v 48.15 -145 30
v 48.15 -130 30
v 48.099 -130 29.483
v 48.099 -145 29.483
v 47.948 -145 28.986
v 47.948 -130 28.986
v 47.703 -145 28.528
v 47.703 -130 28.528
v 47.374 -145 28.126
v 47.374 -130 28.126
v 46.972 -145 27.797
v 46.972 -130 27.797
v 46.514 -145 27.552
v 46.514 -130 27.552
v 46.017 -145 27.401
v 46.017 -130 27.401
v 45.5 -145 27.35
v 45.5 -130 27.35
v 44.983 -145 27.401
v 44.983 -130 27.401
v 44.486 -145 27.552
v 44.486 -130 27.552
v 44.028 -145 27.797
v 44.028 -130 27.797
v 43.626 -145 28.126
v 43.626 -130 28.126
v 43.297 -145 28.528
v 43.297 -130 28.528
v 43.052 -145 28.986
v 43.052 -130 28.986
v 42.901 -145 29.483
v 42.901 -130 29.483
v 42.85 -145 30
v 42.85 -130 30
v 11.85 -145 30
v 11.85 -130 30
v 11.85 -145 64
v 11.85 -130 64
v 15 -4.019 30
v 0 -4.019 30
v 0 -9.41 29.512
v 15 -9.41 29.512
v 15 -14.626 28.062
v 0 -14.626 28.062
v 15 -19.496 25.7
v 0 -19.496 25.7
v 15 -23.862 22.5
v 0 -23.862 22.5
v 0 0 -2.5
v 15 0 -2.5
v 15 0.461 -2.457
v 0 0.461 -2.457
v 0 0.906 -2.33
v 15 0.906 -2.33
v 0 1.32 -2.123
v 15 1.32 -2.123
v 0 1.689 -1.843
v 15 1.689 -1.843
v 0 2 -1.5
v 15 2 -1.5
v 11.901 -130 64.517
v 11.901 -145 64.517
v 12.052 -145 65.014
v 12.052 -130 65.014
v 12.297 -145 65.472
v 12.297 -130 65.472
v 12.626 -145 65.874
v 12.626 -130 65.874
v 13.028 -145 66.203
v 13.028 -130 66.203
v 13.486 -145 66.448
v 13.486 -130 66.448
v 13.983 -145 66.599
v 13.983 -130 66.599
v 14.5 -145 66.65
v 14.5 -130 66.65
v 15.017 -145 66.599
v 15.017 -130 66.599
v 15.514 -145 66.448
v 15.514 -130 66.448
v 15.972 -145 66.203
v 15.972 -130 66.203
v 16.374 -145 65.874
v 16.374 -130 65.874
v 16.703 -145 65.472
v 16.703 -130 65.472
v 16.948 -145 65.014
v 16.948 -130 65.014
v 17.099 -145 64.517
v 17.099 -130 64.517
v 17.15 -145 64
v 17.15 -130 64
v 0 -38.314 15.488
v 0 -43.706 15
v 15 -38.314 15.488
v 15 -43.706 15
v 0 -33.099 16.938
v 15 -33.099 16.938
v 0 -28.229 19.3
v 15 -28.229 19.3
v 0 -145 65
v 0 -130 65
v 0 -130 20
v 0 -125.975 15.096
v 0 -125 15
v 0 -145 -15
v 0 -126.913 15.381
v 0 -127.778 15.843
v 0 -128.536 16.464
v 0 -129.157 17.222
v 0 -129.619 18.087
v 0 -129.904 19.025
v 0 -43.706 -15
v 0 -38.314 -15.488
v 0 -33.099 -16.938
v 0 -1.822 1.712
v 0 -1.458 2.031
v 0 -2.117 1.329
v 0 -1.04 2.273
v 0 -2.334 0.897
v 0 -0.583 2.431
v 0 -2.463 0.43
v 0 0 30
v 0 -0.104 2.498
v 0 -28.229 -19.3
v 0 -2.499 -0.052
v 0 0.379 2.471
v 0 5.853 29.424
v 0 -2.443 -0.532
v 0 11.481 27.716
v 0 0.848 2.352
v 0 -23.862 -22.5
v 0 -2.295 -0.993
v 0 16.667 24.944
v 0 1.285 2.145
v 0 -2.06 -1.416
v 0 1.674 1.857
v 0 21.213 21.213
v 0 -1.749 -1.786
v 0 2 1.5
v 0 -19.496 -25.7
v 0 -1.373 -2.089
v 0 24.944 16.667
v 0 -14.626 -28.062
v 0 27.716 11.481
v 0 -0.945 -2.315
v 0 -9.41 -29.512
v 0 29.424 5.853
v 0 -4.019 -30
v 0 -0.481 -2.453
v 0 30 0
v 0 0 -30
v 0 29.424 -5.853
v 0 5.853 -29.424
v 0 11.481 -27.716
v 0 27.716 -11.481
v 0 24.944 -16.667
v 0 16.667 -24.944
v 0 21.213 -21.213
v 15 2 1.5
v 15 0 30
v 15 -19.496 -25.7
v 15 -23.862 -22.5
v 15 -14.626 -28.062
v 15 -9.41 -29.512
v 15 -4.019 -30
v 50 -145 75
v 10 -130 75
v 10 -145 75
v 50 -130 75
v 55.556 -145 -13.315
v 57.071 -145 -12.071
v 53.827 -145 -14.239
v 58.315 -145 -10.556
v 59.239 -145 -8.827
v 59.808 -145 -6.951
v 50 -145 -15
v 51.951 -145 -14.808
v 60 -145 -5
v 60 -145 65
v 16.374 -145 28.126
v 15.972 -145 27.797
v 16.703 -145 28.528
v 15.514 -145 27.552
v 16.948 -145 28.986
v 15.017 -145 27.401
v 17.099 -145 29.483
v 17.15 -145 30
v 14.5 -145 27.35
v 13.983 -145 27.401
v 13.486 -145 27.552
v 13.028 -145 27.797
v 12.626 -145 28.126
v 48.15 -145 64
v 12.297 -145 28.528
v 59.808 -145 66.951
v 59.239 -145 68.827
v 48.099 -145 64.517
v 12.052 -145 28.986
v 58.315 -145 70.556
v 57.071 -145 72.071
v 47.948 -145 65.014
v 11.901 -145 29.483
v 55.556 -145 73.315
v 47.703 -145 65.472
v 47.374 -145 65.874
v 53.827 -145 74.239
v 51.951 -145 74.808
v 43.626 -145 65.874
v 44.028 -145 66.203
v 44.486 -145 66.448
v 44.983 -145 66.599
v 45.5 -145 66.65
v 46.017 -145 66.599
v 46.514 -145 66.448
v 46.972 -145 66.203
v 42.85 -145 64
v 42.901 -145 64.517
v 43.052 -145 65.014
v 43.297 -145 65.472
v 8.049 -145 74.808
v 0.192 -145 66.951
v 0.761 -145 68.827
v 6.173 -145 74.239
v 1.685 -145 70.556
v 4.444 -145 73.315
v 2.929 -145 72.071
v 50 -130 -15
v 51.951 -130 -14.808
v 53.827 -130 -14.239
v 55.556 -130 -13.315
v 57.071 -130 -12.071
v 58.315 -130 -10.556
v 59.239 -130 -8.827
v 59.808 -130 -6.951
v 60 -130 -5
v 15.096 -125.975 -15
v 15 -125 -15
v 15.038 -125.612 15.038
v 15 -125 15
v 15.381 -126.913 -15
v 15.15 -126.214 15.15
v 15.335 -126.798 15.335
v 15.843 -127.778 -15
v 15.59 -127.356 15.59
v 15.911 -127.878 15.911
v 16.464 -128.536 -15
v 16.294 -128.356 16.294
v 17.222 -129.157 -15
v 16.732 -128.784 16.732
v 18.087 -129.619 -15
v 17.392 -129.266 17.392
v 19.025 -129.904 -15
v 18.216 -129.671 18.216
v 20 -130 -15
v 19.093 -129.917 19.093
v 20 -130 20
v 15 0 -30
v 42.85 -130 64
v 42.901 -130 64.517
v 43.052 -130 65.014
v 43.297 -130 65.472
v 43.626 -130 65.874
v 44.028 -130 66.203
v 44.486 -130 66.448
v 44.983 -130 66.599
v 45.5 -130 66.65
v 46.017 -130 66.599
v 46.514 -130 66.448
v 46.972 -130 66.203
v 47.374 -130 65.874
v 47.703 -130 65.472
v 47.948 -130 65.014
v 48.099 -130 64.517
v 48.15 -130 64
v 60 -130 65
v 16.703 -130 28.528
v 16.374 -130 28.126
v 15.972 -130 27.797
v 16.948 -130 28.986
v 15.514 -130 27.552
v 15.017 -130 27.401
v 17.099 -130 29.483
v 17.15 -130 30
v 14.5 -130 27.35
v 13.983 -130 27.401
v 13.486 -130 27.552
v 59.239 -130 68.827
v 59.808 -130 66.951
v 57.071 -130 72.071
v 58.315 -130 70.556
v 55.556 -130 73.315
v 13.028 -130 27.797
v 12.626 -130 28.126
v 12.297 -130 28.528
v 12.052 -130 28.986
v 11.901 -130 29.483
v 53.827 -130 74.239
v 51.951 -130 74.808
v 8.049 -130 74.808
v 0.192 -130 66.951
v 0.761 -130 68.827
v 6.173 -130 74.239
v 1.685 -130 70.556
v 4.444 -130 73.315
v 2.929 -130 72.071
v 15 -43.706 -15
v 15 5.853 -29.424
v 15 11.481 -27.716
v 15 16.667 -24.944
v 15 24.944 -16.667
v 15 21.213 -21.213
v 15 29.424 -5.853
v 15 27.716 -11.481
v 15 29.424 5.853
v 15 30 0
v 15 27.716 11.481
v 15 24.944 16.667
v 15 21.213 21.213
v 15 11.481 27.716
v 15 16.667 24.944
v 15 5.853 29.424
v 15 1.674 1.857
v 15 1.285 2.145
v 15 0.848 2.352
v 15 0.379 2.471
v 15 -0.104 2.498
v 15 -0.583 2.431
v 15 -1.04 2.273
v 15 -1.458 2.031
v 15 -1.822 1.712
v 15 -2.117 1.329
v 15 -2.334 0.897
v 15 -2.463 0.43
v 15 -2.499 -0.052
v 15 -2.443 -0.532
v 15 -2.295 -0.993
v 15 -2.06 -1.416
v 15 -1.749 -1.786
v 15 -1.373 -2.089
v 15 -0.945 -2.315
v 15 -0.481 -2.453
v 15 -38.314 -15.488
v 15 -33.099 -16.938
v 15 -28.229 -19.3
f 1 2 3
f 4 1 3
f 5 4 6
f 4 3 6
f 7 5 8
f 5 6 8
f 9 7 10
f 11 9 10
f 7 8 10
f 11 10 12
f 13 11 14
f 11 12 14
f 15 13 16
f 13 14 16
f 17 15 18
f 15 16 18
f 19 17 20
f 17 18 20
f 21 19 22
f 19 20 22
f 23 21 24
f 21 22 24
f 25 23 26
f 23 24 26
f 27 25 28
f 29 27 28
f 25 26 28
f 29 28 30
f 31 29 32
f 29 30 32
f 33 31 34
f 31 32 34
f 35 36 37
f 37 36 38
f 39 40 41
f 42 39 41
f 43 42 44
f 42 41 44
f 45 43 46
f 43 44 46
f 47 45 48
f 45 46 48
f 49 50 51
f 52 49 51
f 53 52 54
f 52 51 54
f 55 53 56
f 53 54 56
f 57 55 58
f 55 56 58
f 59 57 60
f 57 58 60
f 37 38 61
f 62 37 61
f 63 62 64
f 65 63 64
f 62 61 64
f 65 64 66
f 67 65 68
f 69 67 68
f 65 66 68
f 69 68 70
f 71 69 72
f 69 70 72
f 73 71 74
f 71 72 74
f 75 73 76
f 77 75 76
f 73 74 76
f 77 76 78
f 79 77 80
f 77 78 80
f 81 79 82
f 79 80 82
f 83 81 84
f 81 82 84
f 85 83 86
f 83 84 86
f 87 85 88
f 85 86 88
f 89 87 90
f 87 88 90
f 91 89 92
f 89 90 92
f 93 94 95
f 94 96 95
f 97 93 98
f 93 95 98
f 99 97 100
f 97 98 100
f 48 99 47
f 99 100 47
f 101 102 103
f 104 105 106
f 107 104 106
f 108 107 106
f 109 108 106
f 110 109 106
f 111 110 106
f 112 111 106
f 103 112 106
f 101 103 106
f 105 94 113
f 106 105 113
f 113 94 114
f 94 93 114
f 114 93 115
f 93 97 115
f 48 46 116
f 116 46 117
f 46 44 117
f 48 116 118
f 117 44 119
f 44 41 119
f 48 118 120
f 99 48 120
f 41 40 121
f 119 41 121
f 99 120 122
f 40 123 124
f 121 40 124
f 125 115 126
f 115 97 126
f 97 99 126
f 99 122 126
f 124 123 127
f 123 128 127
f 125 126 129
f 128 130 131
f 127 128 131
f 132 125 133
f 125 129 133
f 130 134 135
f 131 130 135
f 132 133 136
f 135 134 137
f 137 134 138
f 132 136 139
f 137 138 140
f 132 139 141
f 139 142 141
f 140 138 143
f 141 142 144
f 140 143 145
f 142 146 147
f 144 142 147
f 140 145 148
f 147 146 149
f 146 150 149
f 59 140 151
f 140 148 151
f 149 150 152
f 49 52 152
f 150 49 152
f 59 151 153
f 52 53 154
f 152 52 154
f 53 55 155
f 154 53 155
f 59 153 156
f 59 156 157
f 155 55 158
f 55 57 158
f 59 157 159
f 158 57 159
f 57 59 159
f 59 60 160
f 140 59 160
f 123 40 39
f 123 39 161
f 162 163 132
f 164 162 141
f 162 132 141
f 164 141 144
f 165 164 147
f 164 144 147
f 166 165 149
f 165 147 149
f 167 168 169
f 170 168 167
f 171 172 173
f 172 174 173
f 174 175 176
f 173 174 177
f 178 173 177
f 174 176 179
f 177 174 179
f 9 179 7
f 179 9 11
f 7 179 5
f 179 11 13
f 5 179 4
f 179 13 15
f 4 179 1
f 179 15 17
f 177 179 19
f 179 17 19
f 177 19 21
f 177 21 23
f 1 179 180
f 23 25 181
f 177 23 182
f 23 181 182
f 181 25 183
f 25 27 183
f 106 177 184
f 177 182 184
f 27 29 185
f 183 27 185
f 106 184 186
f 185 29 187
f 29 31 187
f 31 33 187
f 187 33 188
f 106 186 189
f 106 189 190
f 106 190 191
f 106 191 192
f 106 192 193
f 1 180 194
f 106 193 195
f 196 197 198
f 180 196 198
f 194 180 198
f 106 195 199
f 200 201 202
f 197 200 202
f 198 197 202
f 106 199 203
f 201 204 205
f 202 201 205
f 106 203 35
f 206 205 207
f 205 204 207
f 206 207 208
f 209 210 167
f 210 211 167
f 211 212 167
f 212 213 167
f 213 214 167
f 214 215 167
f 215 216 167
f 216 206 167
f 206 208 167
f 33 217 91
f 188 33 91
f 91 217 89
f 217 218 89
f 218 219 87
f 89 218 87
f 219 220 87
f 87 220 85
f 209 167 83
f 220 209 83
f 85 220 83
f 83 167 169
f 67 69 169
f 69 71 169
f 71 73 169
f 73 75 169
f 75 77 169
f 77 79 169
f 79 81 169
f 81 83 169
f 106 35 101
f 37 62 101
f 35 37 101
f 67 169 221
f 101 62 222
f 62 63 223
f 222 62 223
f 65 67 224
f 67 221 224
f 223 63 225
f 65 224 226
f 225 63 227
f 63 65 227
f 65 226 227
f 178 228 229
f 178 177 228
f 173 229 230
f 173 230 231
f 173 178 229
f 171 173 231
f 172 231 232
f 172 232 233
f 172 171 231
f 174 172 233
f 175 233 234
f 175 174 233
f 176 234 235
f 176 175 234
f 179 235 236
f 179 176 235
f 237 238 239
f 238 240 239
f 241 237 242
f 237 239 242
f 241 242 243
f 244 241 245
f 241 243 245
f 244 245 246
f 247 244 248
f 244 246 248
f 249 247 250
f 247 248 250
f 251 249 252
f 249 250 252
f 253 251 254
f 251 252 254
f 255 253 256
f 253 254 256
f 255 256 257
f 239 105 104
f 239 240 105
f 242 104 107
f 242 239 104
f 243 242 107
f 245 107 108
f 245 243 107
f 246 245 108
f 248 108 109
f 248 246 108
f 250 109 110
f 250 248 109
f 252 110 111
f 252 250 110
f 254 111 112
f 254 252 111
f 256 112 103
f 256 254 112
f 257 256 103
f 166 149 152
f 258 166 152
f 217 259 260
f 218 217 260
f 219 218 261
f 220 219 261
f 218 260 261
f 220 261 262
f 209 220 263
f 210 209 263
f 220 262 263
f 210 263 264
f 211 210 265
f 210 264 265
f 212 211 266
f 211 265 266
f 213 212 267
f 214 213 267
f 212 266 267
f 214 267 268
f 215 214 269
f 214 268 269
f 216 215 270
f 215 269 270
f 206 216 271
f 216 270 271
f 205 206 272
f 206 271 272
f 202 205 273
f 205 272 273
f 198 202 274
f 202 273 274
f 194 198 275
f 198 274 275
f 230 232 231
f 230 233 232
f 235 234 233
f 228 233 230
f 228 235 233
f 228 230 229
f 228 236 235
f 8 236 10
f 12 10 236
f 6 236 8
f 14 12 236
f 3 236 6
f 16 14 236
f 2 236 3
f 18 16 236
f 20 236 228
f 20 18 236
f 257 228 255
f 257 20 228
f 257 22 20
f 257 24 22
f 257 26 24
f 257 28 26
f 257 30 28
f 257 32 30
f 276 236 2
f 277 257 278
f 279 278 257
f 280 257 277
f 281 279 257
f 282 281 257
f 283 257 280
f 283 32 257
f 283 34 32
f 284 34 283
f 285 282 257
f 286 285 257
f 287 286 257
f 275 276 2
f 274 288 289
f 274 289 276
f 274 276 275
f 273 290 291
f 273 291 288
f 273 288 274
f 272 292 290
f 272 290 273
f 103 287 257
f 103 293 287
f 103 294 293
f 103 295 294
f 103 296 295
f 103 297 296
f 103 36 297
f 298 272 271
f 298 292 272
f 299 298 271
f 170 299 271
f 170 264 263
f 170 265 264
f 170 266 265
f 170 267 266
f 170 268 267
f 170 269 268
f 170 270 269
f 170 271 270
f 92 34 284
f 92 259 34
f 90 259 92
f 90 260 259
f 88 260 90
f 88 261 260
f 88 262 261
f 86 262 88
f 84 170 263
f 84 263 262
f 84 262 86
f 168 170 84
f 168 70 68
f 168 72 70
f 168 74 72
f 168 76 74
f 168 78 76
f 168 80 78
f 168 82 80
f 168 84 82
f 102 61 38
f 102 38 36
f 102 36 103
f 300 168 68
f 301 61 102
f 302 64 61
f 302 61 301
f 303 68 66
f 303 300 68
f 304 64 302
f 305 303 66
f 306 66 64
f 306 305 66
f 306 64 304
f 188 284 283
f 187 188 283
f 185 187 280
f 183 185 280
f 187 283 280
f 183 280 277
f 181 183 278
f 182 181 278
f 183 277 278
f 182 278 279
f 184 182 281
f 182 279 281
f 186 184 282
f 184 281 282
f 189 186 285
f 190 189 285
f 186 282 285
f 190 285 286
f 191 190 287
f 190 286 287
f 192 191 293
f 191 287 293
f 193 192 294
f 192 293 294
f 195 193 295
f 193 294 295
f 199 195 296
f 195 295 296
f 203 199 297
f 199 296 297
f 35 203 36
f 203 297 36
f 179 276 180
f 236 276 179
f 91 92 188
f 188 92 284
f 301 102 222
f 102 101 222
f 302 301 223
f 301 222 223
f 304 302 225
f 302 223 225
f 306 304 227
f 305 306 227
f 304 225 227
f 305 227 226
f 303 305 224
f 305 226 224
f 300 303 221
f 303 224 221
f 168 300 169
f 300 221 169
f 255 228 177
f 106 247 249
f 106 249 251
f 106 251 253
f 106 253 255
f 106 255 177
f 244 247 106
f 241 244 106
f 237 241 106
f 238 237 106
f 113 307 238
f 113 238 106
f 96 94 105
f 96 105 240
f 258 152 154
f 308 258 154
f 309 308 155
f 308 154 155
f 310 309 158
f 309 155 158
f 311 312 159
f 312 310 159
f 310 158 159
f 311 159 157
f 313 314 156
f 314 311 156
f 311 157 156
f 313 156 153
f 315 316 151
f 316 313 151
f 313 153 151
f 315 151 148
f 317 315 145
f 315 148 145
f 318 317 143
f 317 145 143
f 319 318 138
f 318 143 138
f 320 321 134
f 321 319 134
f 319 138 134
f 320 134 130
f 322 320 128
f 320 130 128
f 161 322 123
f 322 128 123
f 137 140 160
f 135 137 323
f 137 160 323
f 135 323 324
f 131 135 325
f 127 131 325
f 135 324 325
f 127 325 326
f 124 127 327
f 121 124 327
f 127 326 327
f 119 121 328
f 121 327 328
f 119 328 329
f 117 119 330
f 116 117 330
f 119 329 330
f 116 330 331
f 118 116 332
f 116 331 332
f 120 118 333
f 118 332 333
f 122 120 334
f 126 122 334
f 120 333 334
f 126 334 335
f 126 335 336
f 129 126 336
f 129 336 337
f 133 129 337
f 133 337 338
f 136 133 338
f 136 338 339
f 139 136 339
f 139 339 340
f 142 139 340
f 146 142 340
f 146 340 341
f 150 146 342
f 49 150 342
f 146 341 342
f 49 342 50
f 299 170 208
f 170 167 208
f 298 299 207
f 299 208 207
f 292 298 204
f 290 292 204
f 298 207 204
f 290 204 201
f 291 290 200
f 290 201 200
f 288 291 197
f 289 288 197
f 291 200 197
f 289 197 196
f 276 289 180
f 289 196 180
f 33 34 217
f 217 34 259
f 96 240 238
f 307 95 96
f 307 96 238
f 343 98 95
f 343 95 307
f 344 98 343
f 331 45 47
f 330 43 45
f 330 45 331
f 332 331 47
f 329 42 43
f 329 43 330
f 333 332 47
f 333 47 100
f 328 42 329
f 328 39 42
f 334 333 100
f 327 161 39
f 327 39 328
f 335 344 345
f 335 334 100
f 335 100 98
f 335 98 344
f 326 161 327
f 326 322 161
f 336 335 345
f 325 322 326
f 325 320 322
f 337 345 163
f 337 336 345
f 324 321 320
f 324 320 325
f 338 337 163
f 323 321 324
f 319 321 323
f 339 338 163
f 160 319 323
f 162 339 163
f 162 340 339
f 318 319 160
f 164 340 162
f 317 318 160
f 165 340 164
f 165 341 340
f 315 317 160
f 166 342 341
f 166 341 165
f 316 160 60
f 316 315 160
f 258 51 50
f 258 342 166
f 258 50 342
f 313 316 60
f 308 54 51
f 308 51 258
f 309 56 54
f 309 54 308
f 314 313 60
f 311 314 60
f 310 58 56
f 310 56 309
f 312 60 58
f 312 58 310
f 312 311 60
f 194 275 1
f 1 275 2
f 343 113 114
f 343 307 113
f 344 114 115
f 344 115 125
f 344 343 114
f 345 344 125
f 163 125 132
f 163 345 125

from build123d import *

# Parameters (mm, degrees)
SKETCH1_W           = 60
SKETCH1_H           = 60
BOSS_EXTRUDE1_DEPTH = 15
CUT_EXTRUDE1_DEPTH  = 15
SKETCH8_W           = 15
SKETCH8_H           = 30
BOSS_EXTRUDE2_DEPTH = 100
BOSS_EXTRUDE3_DEPTH = 15
CUT_EXTRUDE4_DEPTH  = 15
FILLET1_R           = 30
FILLET3_R           = 5
FILLET4_R           = 10
FILLET5_R           = 30


with BuildPart() as part:
    # Sketch1 → Boss-Extrude1 (new body)
    with BuildSketch(Plane(origin=(0, 0, 0), x_dir=(0, 0, -1), z_dir=(1, 0, 0))):
        Rectangle(SKETCH1_W, SKETCH1_H)
    extrude(amount=BOSS_EXTRUDE1_DEPTH)

    # Sketch2 → Cut-Extrude1 (cut)
    with BuildSketch(Plane(origin=(15, 0, 0), x_dir=(0, 0, -1), z_dir=(1, 0, 0))):
        with BuildLine():
            ThreePointArc((2.5, 0), (2.236067977, 1.118033989), (1.5, 2))
            Line((1.5, 2), (-1.5, 2))
            ThreePointArc((-1.5, 2), (-1.118033989, -2.236067977), (2.5, 0))
        make_face()
    extrude(amount=-CUT_EXTRUDE1_DEPTH, mode=Mode.SUBTRACT)

    # Sketch8 → Boss-Extrude2 (add)
    with BuildSketch(Plane.XZ.offset(30)):
        with Locations((7.5, 0)):
            Rectangle(SKETCH8_W, SKETCH8_H)
    extrude(amount=BOSS_EXTRUDE2_DEPTH)

    # Sketch9 → Boss-Extrude3 (add)
    with BuildSketch(Plane.XZ.offset(130)):
        Polygon((0, 0), (0, 75), (60, 75), (60, -15), (0, -15), align=None)
    extrude(amount=BOSS_EXTRUDE3_DEPTH)

    # Sketch10 → Cut-Extrude4 (cut)
    with BuildSketch(Plane(origin=(0, -130, 0), x_dir=(1, 0, 0), z_dir=(0, 1, 0))):
        with BuildLine():
            Line((48.15, -64), (48.15, -30))
            ThreePointArc((48.15, -30), (45.5, -27.35), (42.85, -30))
            Line((42.85, -30), (42.85, -64))
            ThreePointArc((42.85, -64), (45.5, -66.65), (48.15, -64))
        make_face()
        with BuildLine():
            Line((17.15, -64), (17.15, -30))
            ThreePointArc((17.15, -30), (14.5, -27.35), (11.85, -30))
            Line((11.85, -30), (11.85, -64))
            ThreePointArc((11.85, -64), (14.5, -66.65), (17.15, -64))
        make_face()
    extrude(amount=-CUT_EXTRUDE4_DEPTH, mode=Mode.SUBTRACT)

    # Fillet1
    # the kernel refuses this fillet: 30 mm, written as the material it takes off along each edge
    with BuildSketch(Plane(origin=(-75, 30, 30), x_dir=(0, -1, 0), z_dir=(1, 0, 0))) as fillet1_piece_1:
        with BuildLine():
            CenterArc((FILLET1_R, FILLET1_R), FILLET1_R, 180, 90)
            Line((0, FILLET1_R), (-FILLET1_R * 0.02, FILLET1_R))
            Line((-FILLET1_R * 0.02, FILLET1_R), (-FILLET1_R * 0.02, -FILLET1_R * 0.02))
            Line((-FILLET1_R * 0.02, -FILLET1_R * 0.02), (FILLET1_R, -FILLET1_R * 0.02))
            Line((FILLET1_R, -FILLET1_R * 0.02), (FILLET1_R, 0))
        make_face()
    extrude(amount=165, mode=Mode.SUBTRACT)
    with BuildSketch(Plane(origin=(-64.951905284, -30, 30), x_dir=(0, 0, -1), z_dir=(1, 0, 0))) as fillet1_piece_2:
        with BuildLine():
            CenterArc((30, 25.980762114), FILLET1_R, 180, 60)
            Line((0, 25.980762114), (-0.6, 25.980762114))
            Line((-0.6, 25.980762114), (-0.6, 0))
            Line((-0.6, 0), (0, -0.6))
            ThreePointArc((0, -0.6), (7.5, -0.6), (14.7, -0.519615242))
            Line((14.7, -0.519615242), (15, 0))
        make_face()
    extrude(amount=144.903810568, mode=Mode.SUBTRACT)
    with BuildSketch(Plane(origin=(-64.951905284, -30, -30), x_dir=(0, 0, 1), z_dir=(1, 0, 0))) as fillet1_piece_3:
        with BuildLine():
            CenterArc((30, -25.980762114), FILLET1_R, 120, 60)
            Line((0, -25.980762114), (-0.6, -25.980762114))
            Line((-0.6, -25.980762114), (-0.6, 0))
            Line((-0.6, 0), (0, 0.6))
            ThreePointArc((0, 0.6), (7.5, 0.6), (14.7, 0.519615242))
            Line((14.7, 0.519615242), (15, 0))
        make_face()
    extrude(amount=144.903810568, mode=Mode.SUBTRACT)
    with BuildSketch(Plane(origin=(-75, 30, -30), x_dir=(0, -1, 0), z_dir=(1, 0, 0))) as fillet1_piece_4:
        with BuildLine():
            CenterArc((FILLET1_R, -FILLET1_R), FILLET1_R, 90, 90)
            Line((0, -FILLET1_R), (-FILLET1_R * 0.02, -FILLET1_R))
            Line((-FILLET1_R * 0.02, -FILLET1_R), (-FILLET1_R * 0.02, FILLET1_R * 0.02))
            Line((-FILLET1_R * 0.02, FILLET1_R * 0.02), (FILLET1_R, FILLET1_R * 0.02))
            Line((FILLET1_R, FILLET1_R * 0.02), (FILLET1_R, 0))
        make_face()
    extrude(amount=165, mode=Mode.SUBTRACT)

    # Fillet3
    fillet3_edges = [part.edges().sort_by_distance(p)[0] for p in [
        (15, -130, 0),
        (7.5, -130, 15),
    ]]
    fillet(fillet3_edges, radius=FILLET3_R)

    # Fillet4
    fillet4_edges = [part.edges().sort_by_distance(p)[0] for p in [
        (60, -137.5, -15),
        (60, -137.5, 75),
        (0, -137.5, 75),
    ]]
    fillet(fillet4_edges, radius=FILLET4_R)

    # Fillet5
    fillet5_edges = [part.edges().sort_by_distance(p)[0] for p in [
        (7.5, -30, -15),
        (7.5, -30, 15),
    ]]
    fillet(fillet5_edges, radius=FILLET5_R)


solid = part.part
